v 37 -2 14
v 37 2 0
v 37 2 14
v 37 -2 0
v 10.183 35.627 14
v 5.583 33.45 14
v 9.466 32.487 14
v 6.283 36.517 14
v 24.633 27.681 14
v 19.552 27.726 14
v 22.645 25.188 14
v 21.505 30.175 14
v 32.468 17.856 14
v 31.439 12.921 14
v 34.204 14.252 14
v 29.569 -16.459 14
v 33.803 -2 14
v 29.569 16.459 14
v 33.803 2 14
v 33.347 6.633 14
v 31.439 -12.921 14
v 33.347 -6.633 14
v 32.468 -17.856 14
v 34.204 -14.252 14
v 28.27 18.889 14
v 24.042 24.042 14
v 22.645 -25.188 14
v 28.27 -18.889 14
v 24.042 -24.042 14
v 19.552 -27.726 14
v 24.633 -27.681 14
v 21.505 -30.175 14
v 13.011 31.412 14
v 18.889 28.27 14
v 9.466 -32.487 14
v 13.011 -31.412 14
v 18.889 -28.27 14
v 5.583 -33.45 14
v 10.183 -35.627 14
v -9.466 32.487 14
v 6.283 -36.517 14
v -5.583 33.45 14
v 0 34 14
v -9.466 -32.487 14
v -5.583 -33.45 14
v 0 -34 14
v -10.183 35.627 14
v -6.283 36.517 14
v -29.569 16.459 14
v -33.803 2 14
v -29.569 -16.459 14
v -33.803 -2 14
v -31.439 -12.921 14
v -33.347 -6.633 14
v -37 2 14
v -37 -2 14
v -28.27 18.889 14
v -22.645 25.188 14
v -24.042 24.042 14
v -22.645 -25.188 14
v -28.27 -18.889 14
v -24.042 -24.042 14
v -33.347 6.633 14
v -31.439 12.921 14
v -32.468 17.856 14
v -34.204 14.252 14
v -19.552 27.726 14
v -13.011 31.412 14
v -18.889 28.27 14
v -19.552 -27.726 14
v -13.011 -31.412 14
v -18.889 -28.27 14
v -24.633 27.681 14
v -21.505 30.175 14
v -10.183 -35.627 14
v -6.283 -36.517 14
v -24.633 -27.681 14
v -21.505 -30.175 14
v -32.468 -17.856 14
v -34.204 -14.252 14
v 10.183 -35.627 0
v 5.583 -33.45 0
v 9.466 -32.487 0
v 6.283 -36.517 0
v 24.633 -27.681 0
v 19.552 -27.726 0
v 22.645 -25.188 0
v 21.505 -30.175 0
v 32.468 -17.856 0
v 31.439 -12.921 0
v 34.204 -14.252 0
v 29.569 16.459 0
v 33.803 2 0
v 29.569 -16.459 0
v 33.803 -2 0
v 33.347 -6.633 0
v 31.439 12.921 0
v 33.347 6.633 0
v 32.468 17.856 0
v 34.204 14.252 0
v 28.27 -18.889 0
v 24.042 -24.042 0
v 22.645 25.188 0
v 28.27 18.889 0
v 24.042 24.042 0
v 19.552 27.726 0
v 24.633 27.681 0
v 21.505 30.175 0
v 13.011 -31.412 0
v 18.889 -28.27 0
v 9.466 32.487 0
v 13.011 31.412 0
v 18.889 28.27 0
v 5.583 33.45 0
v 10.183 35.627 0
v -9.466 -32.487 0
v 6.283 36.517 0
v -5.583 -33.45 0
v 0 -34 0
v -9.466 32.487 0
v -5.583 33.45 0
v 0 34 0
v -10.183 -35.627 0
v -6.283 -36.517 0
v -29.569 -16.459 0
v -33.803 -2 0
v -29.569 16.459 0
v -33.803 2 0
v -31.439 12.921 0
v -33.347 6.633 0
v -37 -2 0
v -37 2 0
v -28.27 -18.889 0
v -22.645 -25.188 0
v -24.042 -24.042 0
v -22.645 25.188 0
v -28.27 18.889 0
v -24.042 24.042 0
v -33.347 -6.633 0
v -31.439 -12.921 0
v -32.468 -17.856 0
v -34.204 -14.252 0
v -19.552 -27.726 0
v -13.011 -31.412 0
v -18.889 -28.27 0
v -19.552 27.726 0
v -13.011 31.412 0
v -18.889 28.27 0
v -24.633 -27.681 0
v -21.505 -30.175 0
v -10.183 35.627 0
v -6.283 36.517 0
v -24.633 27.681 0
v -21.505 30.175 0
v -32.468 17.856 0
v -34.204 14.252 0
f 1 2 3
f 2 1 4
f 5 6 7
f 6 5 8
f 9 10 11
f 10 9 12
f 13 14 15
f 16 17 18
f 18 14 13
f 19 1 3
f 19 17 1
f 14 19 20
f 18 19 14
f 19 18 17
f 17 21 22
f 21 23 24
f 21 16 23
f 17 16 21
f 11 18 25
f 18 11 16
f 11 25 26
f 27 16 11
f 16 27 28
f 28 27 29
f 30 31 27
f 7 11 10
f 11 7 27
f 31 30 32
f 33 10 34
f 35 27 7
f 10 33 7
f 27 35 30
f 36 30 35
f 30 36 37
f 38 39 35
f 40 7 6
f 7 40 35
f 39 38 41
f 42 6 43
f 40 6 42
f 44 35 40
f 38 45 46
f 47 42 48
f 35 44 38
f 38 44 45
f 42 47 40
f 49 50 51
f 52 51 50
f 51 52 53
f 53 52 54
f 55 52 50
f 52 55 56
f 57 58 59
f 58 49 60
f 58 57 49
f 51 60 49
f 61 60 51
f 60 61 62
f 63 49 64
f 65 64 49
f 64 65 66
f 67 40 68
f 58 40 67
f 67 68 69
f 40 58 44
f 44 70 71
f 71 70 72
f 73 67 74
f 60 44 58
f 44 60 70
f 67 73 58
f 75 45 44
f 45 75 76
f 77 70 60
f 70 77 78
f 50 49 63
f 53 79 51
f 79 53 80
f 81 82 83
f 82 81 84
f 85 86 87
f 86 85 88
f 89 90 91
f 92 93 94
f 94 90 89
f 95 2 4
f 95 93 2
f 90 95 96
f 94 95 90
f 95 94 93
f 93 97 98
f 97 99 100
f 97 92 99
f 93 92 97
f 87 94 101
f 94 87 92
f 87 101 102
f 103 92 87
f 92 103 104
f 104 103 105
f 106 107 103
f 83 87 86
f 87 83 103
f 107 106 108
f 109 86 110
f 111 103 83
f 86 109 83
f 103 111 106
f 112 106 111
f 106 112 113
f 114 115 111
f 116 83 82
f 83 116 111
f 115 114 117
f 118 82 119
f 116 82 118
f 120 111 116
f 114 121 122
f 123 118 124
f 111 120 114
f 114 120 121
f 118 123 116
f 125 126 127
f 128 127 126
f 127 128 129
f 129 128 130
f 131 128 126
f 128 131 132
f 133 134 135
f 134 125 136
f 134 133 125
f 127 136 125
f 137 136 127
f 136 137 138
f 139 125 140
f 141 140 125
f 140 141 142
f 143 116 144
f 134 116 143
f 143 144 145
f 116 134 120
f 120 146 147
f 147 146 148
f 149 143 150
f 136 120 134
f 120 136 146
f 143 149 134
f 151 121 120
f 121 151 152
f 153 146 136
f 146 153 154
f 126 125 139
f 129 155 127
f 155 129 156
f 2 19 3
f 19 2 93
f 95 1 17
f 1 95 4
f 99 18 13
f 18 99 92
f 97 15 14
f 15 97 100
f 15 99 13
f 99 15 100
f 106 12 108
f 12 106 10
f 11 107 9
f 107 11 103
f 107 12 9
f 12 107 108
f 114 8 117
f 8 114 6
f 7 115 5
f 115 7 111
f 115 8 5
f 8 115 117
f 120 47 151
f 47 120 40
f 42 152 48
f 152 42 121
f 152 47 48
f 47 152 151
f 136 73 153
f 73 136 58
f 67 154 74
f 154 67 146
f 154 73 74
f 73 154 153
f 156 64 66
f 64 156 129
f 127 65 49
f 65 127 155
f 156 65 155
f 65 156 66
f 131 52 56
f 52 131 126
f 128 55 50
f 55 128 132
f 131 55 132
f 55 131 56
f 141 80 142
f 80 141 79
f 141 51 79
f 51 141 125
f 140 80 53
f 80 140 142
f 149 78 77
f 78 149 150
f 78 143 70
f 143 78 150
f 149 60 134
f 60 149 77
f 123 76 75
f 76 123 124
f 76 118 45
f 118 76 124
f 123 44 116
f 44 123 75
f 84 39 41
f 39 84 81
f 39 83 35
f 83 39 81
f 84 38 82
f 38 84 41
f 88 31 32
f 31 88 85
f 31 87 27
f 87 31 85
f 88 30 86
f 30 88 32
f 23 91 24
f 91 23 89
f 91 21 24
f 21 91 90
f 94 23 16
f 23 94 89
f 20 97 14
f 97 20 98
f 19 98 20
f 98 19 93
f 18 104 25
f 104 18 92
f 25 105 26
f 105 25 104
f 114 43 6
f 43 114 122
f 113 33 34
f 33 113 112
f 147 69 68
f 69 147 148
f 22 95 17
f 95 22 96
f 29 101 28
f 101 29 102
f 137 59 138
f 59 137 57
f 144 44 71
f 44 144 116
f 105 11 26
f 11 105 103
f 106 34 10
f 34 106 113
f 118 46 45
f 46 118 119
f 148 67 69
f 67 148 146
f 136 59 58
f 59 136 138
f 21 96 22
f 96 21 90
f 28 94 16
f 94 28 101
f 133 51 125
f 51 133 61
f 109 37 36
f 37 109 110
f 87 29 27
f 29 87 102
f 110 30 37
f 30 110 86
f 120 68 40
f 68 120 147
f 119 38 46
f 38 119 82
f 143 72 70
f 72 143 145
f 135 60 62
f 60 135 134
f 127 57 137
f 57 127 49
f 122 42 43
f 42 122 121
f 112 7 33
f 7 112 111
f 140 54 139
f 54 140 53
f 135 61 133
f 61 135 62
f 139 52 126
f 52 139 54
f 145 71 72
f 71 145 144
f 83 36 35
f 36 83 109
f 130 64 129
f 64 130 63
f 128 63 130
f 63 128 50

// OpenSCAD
$fn = 32;

// ----------------------------------------------------------------------
// Spur blank: plain gear blank
// ----------------------------------------------------------------------

// --- parameters (mm) ---
disc_r = 34;              // blank root radius
disc_t = 14;              // blank thickness
n_teeth = 14;             // stub tooth count
tooth_w = 4;              // tooth width at the root
tooth_h = 3;              // tooth height above the root

out_r = disc_r + tooth_h;  // tip radius
bbox_x = 74.0;  // measured width over the teeth
bbox_y = 73.03;  // measured depth over the teeth

union() {
  cylinder(r = disc_r, h = disc_t);
  for (i = [0 : n_teeth - 1])
    rotate([0, 0, i * 360 / n_teeth])
      translate([disc_r - 1, -tooth_w / 2, 0])
        cube([tooth_h + 1, tooth_w, disc_t]);
}
